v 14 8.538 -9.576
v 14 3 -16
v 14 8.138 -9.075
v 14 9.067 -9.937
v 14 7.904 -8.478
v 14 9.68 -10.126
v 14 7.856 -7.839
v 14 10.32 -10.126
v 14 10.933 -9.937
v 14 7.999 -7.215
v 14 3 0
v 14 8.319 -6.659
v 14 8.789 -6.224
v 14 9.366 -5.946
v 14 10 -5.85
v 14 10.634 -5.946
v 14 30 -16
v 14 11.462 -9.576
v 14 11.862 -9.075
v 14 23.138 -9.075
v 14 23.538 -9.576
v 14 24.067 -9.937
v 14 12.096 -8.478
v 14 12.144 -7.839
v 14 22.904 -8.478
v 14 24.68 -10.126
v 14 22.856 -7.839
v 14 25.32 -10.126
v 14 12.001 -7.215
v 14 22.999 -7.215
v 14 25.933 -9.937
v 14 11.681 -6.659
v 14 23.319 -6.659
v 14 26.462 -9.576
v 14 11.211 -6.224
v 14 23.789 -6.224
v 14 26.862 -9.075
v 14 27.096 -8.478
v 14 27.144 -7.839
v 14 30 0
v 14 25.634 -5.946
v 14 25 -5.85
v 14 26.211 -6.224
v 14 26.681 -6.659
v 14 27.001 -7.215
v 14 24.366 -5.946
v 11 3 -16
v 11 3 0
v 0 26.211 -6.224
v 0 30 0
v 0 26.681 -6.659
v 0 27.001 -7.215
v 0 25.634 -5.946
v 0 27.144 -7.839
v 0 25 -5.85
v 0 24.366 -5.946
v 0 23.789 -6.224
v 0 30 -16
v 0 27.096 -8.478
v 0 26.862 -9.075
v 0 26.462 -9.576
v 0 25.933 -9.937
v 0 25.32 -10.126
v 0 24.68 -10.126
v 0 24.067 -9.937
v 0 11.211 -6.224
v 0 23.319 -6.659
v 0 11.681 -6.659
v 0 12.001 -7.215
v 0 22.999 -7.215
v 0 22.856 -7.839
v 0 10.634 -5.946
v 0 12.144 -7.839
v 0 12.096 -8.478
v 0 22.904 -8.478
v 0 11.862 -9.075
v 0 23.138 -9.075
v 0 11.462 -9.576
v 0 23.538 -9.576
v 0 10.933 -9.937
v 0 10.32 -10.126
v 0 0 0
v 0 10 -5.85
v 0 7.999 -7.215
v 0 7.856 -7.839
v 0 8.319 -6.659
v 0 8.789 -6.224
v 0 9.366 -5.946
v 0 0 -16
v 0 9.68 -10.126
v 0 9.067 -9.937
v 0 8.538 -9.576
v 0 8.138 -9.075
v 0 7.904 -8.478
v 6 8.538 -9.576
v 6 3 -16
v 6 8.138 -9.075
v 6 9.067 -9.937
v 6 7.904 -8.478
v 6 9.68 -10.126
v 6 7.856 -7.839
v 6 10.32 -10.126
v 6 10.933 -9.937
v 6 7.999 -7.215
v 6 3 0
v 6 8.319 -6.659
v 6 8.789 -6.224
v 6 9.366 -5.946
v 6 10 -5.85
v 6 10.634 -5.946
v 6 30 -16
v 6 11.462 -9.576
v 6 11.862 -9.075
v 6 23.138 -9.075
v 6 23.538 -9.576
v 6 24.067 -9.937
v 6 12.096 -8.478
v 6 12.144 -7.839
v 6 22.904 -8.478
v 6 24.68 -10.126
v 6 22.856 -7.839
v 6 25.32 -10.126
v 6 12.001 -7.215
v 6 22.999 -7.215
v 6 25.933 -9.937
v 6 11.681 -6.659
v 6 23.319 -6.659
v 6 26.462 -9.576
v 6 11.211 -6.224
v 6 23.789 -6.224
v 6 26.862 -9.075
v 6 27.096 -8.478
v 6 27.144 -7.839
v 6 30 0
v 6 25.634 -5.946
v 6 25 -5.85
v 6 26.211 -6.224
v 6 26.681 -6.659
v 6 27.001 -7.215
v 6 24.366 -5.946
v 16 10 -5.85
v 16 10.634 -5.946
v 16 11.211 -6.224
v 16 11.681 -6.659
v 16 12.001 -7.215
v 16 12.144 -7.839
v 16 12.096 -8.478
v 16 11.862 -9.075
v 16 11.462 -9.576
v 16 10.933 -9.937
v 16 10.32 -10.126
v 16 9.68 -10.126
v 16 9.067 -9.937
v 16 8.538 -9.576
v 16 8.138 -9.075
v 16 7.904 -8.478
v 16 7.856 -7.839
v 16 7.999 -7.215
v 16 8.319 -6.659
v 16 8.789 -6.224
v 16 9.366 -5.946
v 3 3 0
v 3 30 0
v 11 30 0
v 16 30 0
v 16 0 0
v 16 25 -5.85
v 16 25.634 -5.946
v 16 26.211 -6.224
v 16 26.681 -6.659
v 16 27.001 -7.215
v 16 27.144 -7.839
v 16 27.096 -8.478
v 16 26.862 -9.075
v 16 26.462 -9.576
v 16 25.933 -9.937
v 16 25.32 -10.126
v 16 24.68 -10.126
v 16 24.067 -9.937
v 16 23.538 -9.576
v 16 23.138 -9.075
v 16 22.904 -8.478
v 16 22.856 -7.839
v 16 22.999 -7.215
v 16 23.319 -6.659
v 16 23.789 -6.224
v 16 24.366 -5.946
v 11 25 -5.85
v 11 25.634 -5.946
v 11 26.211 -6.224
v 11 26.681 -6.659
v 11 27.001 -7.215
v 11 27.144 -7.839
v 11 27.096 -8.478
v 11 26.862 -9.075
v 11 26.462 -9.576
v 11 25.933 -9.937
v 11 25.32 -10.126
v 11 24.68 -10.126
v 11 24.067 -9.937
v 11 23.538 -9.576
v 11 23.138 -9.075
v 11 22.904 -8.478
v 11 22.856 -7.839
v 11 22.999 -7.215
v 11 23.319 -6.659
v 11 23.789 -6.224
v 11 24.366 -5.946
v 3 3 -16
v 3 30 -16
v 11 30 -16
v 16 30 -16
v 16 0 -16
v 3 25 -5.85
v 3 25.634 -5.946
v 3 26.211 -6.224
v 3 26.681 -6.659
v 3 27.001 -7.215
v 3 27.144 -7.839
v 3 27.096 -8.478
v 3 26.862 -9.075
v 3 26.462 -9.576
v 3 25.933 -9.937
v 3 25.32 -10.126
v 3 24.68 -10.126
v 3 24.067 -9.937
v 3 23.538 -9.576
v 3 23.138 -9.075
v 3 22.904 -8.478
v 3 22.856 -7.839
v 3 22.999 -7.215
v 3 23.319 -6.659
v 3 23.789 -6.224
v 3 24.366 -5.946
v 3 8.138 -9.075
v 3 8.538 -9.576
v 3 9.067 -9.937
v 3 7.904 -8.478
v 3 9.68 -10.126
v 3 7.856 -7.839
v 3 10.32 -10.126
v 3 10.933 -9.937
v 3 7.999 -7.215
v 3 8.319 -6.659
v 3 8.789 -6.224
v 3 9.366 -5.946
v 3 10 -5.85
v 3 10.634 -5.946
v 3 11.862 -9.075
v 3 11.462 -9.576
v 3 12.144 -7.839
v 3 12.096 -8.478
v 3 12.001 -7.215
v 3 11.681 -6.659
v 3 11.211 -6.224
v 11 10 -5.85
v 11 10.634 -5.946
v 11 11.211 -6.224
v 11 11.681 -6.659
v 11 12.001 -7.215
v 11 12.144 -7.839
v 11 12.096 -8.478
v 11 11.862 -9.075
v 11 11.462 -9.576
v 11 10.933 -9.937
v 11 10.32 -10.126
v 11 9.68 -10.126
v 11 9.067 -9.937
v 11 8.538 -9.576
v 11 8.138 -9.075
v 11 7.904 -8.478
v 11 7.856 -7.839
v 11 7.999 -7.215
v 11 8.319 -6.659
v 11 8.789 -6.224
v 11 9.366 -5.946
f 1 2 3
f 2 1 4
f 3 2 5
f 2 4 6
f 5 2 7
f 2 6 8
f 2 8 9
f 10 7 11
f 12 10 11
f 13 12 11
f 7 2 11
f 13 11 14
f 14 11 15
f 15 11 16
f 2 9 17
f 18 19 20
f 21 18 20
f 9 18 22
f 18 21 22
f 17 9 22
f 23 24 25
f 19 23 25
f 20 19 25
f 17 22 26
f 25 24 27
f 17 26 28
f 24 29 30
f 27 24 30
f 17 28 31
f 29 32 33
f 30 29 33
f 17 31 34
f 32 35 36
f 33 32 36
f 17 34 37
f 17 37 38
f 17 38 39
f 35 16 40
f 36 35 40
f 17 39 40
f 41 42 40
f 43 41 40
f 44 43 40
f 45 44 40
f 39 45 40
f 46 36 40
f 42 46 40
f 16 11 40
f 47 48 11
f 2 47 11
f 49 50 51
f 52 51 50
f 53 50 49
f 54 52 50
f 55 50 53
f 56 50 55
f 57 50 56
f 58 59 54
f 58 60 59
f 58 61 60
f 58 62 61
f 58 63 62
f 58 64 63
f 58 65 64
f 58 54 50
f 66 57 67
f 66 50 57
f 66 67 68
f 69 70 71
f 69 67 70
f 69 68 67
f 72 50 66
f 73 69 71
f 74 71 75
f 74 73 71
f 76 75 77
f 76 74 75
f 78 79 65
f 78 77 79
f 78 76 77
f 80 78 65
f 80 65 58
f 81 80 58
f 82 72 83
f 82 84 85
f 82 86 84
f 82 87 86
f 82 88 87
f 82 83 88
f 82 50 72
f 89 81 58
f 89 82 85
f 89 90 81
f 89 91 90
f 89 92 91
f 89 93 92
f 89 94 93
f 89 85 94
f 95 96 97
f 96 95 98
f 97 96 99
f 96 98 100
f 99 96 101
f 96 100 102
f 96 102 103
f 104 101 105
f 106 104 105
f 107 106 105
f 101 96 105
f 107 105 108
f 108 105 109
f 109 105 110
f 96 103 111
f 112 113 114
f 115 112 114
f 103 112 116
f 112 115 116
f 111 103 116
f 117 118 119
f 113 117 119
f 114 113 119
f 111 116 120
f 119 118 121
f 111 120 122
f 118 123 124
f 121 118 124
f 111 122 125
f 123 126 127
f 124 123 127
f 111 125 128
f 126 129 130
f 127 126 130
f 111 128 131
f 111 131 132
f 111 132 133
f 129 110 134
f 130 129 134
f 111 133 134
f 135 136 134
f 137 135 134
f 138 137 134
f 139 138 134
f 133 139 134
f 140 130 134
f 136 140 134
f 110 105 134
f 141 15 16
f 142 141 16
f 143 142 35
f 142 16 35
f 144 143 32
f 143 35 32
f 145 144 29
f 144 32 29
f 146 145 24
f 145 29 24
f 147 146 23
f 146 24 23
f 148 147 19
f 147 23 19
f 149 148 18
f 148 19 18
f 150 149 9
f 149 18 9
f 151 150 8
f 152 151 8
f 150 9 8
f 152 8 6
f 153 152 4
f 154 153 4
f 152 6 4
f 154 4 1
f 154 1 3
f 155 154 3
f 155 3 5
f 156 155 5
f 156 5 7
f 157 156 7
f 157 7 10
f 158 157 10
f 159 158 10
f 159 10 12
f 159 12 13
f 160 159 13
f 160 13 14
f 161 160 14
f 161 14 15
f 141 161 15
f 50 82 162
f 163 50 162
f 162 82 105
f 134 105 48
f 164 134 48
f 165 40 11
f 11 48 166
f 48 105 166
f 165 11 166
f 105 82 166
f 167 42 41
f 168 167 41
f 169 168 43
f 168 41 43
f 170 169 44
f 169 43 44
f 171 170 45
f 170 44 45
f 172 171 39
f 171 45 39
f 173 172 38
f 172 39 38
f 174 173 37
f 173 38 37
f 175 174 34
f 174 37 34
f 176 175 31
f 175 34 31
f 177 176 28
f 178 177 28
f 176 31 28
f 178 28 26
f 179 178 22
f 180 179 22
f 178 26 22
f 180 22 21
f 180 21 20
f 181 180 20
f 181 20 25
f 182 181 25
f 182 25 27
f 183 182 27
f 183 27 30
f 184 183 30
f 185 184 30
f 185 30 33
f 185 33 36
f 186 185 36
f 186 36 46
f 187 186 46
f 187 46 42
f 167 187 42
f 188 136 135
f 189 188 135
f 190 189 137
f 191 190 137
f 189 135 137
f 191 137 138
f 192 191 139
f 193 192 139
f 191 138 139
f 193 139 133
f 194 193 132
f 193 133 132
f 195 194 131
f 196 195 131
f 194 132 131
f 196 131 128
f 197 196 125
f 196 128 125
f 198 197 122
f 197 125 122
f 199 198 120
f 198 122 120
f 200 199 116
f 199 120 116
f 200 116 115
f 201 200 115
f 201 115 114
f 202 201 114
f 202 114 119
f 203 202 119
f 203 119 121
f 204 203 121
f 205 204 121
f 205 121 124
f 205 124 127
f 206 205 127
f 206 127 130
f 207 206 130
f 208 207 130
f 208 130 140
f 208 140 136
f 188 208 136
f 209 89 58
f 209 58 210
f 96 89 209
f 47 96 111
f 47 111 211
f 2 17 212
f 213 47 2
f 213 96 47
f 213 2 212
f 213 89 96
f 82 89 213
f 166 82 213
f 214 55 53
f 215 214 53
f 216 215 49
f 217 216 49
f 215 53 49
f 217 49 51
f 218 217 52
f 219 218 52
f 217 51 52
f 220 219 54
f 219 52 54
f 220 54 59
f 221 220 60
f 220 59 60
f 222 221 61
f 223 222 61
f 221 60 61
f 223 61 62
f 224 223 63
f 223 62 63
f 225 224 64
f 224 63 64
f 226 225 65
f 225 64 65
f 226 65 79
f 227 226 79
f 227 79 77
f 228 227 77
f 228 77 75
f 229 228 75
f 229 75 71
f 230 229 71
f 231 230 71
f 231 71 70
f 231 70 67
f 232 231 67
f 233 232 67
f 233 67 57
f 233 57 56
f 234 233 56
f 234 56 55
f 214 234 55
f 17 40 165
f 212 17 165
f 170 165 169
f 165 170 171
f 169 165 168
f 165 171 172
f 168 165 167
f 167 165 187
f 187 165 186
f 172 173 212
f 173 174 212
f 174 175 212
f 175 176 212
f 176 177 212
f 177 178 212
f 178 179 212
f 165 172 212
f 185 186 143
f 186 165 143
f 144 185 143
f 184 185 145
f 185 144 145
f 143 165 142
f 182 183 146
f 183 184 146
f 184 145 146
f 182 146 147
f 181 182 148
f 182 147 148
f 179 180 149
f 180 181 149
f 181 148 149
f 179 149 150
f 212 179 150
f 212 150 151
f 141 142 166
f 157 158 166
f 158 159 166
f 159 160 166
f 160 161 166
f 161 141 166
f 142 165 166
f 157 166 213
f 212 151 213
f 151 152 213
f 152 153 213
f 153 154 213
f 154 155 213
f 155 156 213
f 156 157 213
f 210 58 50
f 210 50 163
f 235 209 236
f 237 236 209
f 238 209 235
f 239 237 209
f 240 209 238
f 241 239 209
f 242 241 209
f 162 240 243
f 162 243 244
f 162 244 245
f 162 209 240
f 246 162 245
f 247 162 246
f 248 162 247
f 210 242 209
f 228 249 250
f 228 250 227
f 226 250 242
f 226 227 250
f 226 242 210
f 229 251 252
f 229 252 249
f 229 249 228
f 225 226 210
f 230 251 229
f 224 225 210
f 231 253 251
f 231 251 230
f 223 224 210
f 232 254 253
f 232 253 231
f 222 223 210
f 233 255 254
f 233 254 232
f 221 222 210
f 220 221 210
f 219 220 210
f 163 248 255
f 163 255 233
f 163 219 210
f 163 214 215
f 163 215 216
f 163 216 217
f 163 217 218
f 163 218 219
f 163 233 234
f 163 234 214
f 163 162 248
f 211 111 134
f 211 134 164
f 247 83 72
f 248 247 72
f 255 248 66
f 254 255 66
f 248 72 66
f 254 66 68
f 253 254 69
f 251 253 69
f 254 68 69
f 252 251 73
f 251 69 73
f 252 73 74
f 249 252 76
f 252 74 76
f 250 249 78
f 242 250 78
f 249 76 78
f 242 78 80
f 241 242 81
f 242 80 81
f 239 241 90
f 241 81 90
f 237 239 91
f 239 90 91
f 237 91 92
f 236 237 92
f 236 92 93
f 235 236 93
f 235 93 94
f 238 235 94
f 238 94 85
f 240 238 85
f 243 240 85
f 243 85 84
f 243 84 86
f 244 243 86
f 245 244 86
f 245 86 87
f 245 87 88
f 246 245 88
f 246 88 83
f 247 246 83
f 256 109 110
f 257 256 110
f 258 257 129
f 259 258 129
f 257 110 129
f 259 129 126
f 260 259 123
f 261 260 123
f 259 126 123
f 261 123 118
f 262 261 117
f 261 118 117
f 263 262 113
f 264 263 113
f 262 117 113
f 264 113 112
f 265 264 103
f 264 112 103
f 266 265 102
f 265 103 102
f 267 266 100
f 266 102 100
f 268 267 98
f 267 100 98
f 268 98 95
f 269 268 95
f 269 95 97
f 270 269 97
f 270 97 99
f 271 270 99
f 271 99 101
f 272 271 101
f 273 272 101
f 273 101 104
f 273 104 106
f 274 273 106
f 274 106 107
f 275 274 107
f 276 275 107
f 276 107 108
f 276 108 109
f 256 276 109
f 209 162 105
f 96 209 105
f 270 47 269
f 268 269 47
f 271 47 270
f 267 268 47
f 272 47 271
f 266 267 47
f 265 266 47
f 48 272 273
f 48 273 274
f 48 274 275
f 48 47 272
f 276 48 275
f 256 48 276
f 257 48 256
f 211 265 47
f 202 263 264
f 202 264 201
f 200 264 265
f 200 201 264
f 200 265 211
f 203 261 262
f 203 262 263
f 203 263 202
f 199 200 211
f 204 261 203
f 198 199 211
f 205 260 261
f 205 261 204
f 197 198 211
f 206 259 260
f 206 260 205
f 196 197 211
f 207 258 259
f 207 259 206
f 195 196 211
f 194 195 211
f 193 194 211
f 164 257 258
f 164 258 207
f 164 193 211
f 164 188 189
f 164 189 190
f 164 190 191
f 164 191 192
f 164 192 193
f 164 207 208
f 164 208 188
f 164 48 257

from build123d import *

# Parameters (mm, degrees)
SKETCH1_W           = 16
SKETCH1_H           = 16
BOSS_EXTRUDE1_DEPTH = 30
SKETCH2_W           = 3
SKETCH2_H           = 27
CUT_EXTRUDE1_DEPTH  = 17
SKETCH3_R           = 2.15
CUT_EXTRUDE2_DEPTH  = 17


with BuildPart() as part:
    # Sketch1 → Boss-Extrude1 (new body)
    with BuildSketch(Plane(origin=(0, 0, 0), x_dir=(1, 0, 0), z_dir=(0, 1, 0))):
        with Locations((8, 8)):
            Rectangle(SKETCH1_W, SKETCH1_H)
    extrude(amount=BOSS_EXTRUDE1_DEPTH)

    # Sketch2 → Cut-Extrude1 (cut, through all)
    with BuildSketch(Plane.XY):
        with Locations((4.5, 16.5)):
            Rectangle(SKETCH2_W, SKETCH2_H)
        with Locations((12.5, 16.5)):
            Rectangle(SKETCH2_W, SKETCH2_H)
    extrude(amount=-CUT_EXTRUDE1_DEPTH, mode=Mode.SUBTRACT)

    # Sketch3 → Cut-Extrude2 (cut, through all)
    with BuildSketch(Plane.ZY):
        with Locations((-8, 25)):
            Circle(SKETCH3_R)
        with Locations((-8, 10)):
            Circle(SKETCH3_R)
    extrude(amount=-CUT_EXTRUDE2_DEPTH, mode=Mode.SUBTRACT)


solid = part.part
